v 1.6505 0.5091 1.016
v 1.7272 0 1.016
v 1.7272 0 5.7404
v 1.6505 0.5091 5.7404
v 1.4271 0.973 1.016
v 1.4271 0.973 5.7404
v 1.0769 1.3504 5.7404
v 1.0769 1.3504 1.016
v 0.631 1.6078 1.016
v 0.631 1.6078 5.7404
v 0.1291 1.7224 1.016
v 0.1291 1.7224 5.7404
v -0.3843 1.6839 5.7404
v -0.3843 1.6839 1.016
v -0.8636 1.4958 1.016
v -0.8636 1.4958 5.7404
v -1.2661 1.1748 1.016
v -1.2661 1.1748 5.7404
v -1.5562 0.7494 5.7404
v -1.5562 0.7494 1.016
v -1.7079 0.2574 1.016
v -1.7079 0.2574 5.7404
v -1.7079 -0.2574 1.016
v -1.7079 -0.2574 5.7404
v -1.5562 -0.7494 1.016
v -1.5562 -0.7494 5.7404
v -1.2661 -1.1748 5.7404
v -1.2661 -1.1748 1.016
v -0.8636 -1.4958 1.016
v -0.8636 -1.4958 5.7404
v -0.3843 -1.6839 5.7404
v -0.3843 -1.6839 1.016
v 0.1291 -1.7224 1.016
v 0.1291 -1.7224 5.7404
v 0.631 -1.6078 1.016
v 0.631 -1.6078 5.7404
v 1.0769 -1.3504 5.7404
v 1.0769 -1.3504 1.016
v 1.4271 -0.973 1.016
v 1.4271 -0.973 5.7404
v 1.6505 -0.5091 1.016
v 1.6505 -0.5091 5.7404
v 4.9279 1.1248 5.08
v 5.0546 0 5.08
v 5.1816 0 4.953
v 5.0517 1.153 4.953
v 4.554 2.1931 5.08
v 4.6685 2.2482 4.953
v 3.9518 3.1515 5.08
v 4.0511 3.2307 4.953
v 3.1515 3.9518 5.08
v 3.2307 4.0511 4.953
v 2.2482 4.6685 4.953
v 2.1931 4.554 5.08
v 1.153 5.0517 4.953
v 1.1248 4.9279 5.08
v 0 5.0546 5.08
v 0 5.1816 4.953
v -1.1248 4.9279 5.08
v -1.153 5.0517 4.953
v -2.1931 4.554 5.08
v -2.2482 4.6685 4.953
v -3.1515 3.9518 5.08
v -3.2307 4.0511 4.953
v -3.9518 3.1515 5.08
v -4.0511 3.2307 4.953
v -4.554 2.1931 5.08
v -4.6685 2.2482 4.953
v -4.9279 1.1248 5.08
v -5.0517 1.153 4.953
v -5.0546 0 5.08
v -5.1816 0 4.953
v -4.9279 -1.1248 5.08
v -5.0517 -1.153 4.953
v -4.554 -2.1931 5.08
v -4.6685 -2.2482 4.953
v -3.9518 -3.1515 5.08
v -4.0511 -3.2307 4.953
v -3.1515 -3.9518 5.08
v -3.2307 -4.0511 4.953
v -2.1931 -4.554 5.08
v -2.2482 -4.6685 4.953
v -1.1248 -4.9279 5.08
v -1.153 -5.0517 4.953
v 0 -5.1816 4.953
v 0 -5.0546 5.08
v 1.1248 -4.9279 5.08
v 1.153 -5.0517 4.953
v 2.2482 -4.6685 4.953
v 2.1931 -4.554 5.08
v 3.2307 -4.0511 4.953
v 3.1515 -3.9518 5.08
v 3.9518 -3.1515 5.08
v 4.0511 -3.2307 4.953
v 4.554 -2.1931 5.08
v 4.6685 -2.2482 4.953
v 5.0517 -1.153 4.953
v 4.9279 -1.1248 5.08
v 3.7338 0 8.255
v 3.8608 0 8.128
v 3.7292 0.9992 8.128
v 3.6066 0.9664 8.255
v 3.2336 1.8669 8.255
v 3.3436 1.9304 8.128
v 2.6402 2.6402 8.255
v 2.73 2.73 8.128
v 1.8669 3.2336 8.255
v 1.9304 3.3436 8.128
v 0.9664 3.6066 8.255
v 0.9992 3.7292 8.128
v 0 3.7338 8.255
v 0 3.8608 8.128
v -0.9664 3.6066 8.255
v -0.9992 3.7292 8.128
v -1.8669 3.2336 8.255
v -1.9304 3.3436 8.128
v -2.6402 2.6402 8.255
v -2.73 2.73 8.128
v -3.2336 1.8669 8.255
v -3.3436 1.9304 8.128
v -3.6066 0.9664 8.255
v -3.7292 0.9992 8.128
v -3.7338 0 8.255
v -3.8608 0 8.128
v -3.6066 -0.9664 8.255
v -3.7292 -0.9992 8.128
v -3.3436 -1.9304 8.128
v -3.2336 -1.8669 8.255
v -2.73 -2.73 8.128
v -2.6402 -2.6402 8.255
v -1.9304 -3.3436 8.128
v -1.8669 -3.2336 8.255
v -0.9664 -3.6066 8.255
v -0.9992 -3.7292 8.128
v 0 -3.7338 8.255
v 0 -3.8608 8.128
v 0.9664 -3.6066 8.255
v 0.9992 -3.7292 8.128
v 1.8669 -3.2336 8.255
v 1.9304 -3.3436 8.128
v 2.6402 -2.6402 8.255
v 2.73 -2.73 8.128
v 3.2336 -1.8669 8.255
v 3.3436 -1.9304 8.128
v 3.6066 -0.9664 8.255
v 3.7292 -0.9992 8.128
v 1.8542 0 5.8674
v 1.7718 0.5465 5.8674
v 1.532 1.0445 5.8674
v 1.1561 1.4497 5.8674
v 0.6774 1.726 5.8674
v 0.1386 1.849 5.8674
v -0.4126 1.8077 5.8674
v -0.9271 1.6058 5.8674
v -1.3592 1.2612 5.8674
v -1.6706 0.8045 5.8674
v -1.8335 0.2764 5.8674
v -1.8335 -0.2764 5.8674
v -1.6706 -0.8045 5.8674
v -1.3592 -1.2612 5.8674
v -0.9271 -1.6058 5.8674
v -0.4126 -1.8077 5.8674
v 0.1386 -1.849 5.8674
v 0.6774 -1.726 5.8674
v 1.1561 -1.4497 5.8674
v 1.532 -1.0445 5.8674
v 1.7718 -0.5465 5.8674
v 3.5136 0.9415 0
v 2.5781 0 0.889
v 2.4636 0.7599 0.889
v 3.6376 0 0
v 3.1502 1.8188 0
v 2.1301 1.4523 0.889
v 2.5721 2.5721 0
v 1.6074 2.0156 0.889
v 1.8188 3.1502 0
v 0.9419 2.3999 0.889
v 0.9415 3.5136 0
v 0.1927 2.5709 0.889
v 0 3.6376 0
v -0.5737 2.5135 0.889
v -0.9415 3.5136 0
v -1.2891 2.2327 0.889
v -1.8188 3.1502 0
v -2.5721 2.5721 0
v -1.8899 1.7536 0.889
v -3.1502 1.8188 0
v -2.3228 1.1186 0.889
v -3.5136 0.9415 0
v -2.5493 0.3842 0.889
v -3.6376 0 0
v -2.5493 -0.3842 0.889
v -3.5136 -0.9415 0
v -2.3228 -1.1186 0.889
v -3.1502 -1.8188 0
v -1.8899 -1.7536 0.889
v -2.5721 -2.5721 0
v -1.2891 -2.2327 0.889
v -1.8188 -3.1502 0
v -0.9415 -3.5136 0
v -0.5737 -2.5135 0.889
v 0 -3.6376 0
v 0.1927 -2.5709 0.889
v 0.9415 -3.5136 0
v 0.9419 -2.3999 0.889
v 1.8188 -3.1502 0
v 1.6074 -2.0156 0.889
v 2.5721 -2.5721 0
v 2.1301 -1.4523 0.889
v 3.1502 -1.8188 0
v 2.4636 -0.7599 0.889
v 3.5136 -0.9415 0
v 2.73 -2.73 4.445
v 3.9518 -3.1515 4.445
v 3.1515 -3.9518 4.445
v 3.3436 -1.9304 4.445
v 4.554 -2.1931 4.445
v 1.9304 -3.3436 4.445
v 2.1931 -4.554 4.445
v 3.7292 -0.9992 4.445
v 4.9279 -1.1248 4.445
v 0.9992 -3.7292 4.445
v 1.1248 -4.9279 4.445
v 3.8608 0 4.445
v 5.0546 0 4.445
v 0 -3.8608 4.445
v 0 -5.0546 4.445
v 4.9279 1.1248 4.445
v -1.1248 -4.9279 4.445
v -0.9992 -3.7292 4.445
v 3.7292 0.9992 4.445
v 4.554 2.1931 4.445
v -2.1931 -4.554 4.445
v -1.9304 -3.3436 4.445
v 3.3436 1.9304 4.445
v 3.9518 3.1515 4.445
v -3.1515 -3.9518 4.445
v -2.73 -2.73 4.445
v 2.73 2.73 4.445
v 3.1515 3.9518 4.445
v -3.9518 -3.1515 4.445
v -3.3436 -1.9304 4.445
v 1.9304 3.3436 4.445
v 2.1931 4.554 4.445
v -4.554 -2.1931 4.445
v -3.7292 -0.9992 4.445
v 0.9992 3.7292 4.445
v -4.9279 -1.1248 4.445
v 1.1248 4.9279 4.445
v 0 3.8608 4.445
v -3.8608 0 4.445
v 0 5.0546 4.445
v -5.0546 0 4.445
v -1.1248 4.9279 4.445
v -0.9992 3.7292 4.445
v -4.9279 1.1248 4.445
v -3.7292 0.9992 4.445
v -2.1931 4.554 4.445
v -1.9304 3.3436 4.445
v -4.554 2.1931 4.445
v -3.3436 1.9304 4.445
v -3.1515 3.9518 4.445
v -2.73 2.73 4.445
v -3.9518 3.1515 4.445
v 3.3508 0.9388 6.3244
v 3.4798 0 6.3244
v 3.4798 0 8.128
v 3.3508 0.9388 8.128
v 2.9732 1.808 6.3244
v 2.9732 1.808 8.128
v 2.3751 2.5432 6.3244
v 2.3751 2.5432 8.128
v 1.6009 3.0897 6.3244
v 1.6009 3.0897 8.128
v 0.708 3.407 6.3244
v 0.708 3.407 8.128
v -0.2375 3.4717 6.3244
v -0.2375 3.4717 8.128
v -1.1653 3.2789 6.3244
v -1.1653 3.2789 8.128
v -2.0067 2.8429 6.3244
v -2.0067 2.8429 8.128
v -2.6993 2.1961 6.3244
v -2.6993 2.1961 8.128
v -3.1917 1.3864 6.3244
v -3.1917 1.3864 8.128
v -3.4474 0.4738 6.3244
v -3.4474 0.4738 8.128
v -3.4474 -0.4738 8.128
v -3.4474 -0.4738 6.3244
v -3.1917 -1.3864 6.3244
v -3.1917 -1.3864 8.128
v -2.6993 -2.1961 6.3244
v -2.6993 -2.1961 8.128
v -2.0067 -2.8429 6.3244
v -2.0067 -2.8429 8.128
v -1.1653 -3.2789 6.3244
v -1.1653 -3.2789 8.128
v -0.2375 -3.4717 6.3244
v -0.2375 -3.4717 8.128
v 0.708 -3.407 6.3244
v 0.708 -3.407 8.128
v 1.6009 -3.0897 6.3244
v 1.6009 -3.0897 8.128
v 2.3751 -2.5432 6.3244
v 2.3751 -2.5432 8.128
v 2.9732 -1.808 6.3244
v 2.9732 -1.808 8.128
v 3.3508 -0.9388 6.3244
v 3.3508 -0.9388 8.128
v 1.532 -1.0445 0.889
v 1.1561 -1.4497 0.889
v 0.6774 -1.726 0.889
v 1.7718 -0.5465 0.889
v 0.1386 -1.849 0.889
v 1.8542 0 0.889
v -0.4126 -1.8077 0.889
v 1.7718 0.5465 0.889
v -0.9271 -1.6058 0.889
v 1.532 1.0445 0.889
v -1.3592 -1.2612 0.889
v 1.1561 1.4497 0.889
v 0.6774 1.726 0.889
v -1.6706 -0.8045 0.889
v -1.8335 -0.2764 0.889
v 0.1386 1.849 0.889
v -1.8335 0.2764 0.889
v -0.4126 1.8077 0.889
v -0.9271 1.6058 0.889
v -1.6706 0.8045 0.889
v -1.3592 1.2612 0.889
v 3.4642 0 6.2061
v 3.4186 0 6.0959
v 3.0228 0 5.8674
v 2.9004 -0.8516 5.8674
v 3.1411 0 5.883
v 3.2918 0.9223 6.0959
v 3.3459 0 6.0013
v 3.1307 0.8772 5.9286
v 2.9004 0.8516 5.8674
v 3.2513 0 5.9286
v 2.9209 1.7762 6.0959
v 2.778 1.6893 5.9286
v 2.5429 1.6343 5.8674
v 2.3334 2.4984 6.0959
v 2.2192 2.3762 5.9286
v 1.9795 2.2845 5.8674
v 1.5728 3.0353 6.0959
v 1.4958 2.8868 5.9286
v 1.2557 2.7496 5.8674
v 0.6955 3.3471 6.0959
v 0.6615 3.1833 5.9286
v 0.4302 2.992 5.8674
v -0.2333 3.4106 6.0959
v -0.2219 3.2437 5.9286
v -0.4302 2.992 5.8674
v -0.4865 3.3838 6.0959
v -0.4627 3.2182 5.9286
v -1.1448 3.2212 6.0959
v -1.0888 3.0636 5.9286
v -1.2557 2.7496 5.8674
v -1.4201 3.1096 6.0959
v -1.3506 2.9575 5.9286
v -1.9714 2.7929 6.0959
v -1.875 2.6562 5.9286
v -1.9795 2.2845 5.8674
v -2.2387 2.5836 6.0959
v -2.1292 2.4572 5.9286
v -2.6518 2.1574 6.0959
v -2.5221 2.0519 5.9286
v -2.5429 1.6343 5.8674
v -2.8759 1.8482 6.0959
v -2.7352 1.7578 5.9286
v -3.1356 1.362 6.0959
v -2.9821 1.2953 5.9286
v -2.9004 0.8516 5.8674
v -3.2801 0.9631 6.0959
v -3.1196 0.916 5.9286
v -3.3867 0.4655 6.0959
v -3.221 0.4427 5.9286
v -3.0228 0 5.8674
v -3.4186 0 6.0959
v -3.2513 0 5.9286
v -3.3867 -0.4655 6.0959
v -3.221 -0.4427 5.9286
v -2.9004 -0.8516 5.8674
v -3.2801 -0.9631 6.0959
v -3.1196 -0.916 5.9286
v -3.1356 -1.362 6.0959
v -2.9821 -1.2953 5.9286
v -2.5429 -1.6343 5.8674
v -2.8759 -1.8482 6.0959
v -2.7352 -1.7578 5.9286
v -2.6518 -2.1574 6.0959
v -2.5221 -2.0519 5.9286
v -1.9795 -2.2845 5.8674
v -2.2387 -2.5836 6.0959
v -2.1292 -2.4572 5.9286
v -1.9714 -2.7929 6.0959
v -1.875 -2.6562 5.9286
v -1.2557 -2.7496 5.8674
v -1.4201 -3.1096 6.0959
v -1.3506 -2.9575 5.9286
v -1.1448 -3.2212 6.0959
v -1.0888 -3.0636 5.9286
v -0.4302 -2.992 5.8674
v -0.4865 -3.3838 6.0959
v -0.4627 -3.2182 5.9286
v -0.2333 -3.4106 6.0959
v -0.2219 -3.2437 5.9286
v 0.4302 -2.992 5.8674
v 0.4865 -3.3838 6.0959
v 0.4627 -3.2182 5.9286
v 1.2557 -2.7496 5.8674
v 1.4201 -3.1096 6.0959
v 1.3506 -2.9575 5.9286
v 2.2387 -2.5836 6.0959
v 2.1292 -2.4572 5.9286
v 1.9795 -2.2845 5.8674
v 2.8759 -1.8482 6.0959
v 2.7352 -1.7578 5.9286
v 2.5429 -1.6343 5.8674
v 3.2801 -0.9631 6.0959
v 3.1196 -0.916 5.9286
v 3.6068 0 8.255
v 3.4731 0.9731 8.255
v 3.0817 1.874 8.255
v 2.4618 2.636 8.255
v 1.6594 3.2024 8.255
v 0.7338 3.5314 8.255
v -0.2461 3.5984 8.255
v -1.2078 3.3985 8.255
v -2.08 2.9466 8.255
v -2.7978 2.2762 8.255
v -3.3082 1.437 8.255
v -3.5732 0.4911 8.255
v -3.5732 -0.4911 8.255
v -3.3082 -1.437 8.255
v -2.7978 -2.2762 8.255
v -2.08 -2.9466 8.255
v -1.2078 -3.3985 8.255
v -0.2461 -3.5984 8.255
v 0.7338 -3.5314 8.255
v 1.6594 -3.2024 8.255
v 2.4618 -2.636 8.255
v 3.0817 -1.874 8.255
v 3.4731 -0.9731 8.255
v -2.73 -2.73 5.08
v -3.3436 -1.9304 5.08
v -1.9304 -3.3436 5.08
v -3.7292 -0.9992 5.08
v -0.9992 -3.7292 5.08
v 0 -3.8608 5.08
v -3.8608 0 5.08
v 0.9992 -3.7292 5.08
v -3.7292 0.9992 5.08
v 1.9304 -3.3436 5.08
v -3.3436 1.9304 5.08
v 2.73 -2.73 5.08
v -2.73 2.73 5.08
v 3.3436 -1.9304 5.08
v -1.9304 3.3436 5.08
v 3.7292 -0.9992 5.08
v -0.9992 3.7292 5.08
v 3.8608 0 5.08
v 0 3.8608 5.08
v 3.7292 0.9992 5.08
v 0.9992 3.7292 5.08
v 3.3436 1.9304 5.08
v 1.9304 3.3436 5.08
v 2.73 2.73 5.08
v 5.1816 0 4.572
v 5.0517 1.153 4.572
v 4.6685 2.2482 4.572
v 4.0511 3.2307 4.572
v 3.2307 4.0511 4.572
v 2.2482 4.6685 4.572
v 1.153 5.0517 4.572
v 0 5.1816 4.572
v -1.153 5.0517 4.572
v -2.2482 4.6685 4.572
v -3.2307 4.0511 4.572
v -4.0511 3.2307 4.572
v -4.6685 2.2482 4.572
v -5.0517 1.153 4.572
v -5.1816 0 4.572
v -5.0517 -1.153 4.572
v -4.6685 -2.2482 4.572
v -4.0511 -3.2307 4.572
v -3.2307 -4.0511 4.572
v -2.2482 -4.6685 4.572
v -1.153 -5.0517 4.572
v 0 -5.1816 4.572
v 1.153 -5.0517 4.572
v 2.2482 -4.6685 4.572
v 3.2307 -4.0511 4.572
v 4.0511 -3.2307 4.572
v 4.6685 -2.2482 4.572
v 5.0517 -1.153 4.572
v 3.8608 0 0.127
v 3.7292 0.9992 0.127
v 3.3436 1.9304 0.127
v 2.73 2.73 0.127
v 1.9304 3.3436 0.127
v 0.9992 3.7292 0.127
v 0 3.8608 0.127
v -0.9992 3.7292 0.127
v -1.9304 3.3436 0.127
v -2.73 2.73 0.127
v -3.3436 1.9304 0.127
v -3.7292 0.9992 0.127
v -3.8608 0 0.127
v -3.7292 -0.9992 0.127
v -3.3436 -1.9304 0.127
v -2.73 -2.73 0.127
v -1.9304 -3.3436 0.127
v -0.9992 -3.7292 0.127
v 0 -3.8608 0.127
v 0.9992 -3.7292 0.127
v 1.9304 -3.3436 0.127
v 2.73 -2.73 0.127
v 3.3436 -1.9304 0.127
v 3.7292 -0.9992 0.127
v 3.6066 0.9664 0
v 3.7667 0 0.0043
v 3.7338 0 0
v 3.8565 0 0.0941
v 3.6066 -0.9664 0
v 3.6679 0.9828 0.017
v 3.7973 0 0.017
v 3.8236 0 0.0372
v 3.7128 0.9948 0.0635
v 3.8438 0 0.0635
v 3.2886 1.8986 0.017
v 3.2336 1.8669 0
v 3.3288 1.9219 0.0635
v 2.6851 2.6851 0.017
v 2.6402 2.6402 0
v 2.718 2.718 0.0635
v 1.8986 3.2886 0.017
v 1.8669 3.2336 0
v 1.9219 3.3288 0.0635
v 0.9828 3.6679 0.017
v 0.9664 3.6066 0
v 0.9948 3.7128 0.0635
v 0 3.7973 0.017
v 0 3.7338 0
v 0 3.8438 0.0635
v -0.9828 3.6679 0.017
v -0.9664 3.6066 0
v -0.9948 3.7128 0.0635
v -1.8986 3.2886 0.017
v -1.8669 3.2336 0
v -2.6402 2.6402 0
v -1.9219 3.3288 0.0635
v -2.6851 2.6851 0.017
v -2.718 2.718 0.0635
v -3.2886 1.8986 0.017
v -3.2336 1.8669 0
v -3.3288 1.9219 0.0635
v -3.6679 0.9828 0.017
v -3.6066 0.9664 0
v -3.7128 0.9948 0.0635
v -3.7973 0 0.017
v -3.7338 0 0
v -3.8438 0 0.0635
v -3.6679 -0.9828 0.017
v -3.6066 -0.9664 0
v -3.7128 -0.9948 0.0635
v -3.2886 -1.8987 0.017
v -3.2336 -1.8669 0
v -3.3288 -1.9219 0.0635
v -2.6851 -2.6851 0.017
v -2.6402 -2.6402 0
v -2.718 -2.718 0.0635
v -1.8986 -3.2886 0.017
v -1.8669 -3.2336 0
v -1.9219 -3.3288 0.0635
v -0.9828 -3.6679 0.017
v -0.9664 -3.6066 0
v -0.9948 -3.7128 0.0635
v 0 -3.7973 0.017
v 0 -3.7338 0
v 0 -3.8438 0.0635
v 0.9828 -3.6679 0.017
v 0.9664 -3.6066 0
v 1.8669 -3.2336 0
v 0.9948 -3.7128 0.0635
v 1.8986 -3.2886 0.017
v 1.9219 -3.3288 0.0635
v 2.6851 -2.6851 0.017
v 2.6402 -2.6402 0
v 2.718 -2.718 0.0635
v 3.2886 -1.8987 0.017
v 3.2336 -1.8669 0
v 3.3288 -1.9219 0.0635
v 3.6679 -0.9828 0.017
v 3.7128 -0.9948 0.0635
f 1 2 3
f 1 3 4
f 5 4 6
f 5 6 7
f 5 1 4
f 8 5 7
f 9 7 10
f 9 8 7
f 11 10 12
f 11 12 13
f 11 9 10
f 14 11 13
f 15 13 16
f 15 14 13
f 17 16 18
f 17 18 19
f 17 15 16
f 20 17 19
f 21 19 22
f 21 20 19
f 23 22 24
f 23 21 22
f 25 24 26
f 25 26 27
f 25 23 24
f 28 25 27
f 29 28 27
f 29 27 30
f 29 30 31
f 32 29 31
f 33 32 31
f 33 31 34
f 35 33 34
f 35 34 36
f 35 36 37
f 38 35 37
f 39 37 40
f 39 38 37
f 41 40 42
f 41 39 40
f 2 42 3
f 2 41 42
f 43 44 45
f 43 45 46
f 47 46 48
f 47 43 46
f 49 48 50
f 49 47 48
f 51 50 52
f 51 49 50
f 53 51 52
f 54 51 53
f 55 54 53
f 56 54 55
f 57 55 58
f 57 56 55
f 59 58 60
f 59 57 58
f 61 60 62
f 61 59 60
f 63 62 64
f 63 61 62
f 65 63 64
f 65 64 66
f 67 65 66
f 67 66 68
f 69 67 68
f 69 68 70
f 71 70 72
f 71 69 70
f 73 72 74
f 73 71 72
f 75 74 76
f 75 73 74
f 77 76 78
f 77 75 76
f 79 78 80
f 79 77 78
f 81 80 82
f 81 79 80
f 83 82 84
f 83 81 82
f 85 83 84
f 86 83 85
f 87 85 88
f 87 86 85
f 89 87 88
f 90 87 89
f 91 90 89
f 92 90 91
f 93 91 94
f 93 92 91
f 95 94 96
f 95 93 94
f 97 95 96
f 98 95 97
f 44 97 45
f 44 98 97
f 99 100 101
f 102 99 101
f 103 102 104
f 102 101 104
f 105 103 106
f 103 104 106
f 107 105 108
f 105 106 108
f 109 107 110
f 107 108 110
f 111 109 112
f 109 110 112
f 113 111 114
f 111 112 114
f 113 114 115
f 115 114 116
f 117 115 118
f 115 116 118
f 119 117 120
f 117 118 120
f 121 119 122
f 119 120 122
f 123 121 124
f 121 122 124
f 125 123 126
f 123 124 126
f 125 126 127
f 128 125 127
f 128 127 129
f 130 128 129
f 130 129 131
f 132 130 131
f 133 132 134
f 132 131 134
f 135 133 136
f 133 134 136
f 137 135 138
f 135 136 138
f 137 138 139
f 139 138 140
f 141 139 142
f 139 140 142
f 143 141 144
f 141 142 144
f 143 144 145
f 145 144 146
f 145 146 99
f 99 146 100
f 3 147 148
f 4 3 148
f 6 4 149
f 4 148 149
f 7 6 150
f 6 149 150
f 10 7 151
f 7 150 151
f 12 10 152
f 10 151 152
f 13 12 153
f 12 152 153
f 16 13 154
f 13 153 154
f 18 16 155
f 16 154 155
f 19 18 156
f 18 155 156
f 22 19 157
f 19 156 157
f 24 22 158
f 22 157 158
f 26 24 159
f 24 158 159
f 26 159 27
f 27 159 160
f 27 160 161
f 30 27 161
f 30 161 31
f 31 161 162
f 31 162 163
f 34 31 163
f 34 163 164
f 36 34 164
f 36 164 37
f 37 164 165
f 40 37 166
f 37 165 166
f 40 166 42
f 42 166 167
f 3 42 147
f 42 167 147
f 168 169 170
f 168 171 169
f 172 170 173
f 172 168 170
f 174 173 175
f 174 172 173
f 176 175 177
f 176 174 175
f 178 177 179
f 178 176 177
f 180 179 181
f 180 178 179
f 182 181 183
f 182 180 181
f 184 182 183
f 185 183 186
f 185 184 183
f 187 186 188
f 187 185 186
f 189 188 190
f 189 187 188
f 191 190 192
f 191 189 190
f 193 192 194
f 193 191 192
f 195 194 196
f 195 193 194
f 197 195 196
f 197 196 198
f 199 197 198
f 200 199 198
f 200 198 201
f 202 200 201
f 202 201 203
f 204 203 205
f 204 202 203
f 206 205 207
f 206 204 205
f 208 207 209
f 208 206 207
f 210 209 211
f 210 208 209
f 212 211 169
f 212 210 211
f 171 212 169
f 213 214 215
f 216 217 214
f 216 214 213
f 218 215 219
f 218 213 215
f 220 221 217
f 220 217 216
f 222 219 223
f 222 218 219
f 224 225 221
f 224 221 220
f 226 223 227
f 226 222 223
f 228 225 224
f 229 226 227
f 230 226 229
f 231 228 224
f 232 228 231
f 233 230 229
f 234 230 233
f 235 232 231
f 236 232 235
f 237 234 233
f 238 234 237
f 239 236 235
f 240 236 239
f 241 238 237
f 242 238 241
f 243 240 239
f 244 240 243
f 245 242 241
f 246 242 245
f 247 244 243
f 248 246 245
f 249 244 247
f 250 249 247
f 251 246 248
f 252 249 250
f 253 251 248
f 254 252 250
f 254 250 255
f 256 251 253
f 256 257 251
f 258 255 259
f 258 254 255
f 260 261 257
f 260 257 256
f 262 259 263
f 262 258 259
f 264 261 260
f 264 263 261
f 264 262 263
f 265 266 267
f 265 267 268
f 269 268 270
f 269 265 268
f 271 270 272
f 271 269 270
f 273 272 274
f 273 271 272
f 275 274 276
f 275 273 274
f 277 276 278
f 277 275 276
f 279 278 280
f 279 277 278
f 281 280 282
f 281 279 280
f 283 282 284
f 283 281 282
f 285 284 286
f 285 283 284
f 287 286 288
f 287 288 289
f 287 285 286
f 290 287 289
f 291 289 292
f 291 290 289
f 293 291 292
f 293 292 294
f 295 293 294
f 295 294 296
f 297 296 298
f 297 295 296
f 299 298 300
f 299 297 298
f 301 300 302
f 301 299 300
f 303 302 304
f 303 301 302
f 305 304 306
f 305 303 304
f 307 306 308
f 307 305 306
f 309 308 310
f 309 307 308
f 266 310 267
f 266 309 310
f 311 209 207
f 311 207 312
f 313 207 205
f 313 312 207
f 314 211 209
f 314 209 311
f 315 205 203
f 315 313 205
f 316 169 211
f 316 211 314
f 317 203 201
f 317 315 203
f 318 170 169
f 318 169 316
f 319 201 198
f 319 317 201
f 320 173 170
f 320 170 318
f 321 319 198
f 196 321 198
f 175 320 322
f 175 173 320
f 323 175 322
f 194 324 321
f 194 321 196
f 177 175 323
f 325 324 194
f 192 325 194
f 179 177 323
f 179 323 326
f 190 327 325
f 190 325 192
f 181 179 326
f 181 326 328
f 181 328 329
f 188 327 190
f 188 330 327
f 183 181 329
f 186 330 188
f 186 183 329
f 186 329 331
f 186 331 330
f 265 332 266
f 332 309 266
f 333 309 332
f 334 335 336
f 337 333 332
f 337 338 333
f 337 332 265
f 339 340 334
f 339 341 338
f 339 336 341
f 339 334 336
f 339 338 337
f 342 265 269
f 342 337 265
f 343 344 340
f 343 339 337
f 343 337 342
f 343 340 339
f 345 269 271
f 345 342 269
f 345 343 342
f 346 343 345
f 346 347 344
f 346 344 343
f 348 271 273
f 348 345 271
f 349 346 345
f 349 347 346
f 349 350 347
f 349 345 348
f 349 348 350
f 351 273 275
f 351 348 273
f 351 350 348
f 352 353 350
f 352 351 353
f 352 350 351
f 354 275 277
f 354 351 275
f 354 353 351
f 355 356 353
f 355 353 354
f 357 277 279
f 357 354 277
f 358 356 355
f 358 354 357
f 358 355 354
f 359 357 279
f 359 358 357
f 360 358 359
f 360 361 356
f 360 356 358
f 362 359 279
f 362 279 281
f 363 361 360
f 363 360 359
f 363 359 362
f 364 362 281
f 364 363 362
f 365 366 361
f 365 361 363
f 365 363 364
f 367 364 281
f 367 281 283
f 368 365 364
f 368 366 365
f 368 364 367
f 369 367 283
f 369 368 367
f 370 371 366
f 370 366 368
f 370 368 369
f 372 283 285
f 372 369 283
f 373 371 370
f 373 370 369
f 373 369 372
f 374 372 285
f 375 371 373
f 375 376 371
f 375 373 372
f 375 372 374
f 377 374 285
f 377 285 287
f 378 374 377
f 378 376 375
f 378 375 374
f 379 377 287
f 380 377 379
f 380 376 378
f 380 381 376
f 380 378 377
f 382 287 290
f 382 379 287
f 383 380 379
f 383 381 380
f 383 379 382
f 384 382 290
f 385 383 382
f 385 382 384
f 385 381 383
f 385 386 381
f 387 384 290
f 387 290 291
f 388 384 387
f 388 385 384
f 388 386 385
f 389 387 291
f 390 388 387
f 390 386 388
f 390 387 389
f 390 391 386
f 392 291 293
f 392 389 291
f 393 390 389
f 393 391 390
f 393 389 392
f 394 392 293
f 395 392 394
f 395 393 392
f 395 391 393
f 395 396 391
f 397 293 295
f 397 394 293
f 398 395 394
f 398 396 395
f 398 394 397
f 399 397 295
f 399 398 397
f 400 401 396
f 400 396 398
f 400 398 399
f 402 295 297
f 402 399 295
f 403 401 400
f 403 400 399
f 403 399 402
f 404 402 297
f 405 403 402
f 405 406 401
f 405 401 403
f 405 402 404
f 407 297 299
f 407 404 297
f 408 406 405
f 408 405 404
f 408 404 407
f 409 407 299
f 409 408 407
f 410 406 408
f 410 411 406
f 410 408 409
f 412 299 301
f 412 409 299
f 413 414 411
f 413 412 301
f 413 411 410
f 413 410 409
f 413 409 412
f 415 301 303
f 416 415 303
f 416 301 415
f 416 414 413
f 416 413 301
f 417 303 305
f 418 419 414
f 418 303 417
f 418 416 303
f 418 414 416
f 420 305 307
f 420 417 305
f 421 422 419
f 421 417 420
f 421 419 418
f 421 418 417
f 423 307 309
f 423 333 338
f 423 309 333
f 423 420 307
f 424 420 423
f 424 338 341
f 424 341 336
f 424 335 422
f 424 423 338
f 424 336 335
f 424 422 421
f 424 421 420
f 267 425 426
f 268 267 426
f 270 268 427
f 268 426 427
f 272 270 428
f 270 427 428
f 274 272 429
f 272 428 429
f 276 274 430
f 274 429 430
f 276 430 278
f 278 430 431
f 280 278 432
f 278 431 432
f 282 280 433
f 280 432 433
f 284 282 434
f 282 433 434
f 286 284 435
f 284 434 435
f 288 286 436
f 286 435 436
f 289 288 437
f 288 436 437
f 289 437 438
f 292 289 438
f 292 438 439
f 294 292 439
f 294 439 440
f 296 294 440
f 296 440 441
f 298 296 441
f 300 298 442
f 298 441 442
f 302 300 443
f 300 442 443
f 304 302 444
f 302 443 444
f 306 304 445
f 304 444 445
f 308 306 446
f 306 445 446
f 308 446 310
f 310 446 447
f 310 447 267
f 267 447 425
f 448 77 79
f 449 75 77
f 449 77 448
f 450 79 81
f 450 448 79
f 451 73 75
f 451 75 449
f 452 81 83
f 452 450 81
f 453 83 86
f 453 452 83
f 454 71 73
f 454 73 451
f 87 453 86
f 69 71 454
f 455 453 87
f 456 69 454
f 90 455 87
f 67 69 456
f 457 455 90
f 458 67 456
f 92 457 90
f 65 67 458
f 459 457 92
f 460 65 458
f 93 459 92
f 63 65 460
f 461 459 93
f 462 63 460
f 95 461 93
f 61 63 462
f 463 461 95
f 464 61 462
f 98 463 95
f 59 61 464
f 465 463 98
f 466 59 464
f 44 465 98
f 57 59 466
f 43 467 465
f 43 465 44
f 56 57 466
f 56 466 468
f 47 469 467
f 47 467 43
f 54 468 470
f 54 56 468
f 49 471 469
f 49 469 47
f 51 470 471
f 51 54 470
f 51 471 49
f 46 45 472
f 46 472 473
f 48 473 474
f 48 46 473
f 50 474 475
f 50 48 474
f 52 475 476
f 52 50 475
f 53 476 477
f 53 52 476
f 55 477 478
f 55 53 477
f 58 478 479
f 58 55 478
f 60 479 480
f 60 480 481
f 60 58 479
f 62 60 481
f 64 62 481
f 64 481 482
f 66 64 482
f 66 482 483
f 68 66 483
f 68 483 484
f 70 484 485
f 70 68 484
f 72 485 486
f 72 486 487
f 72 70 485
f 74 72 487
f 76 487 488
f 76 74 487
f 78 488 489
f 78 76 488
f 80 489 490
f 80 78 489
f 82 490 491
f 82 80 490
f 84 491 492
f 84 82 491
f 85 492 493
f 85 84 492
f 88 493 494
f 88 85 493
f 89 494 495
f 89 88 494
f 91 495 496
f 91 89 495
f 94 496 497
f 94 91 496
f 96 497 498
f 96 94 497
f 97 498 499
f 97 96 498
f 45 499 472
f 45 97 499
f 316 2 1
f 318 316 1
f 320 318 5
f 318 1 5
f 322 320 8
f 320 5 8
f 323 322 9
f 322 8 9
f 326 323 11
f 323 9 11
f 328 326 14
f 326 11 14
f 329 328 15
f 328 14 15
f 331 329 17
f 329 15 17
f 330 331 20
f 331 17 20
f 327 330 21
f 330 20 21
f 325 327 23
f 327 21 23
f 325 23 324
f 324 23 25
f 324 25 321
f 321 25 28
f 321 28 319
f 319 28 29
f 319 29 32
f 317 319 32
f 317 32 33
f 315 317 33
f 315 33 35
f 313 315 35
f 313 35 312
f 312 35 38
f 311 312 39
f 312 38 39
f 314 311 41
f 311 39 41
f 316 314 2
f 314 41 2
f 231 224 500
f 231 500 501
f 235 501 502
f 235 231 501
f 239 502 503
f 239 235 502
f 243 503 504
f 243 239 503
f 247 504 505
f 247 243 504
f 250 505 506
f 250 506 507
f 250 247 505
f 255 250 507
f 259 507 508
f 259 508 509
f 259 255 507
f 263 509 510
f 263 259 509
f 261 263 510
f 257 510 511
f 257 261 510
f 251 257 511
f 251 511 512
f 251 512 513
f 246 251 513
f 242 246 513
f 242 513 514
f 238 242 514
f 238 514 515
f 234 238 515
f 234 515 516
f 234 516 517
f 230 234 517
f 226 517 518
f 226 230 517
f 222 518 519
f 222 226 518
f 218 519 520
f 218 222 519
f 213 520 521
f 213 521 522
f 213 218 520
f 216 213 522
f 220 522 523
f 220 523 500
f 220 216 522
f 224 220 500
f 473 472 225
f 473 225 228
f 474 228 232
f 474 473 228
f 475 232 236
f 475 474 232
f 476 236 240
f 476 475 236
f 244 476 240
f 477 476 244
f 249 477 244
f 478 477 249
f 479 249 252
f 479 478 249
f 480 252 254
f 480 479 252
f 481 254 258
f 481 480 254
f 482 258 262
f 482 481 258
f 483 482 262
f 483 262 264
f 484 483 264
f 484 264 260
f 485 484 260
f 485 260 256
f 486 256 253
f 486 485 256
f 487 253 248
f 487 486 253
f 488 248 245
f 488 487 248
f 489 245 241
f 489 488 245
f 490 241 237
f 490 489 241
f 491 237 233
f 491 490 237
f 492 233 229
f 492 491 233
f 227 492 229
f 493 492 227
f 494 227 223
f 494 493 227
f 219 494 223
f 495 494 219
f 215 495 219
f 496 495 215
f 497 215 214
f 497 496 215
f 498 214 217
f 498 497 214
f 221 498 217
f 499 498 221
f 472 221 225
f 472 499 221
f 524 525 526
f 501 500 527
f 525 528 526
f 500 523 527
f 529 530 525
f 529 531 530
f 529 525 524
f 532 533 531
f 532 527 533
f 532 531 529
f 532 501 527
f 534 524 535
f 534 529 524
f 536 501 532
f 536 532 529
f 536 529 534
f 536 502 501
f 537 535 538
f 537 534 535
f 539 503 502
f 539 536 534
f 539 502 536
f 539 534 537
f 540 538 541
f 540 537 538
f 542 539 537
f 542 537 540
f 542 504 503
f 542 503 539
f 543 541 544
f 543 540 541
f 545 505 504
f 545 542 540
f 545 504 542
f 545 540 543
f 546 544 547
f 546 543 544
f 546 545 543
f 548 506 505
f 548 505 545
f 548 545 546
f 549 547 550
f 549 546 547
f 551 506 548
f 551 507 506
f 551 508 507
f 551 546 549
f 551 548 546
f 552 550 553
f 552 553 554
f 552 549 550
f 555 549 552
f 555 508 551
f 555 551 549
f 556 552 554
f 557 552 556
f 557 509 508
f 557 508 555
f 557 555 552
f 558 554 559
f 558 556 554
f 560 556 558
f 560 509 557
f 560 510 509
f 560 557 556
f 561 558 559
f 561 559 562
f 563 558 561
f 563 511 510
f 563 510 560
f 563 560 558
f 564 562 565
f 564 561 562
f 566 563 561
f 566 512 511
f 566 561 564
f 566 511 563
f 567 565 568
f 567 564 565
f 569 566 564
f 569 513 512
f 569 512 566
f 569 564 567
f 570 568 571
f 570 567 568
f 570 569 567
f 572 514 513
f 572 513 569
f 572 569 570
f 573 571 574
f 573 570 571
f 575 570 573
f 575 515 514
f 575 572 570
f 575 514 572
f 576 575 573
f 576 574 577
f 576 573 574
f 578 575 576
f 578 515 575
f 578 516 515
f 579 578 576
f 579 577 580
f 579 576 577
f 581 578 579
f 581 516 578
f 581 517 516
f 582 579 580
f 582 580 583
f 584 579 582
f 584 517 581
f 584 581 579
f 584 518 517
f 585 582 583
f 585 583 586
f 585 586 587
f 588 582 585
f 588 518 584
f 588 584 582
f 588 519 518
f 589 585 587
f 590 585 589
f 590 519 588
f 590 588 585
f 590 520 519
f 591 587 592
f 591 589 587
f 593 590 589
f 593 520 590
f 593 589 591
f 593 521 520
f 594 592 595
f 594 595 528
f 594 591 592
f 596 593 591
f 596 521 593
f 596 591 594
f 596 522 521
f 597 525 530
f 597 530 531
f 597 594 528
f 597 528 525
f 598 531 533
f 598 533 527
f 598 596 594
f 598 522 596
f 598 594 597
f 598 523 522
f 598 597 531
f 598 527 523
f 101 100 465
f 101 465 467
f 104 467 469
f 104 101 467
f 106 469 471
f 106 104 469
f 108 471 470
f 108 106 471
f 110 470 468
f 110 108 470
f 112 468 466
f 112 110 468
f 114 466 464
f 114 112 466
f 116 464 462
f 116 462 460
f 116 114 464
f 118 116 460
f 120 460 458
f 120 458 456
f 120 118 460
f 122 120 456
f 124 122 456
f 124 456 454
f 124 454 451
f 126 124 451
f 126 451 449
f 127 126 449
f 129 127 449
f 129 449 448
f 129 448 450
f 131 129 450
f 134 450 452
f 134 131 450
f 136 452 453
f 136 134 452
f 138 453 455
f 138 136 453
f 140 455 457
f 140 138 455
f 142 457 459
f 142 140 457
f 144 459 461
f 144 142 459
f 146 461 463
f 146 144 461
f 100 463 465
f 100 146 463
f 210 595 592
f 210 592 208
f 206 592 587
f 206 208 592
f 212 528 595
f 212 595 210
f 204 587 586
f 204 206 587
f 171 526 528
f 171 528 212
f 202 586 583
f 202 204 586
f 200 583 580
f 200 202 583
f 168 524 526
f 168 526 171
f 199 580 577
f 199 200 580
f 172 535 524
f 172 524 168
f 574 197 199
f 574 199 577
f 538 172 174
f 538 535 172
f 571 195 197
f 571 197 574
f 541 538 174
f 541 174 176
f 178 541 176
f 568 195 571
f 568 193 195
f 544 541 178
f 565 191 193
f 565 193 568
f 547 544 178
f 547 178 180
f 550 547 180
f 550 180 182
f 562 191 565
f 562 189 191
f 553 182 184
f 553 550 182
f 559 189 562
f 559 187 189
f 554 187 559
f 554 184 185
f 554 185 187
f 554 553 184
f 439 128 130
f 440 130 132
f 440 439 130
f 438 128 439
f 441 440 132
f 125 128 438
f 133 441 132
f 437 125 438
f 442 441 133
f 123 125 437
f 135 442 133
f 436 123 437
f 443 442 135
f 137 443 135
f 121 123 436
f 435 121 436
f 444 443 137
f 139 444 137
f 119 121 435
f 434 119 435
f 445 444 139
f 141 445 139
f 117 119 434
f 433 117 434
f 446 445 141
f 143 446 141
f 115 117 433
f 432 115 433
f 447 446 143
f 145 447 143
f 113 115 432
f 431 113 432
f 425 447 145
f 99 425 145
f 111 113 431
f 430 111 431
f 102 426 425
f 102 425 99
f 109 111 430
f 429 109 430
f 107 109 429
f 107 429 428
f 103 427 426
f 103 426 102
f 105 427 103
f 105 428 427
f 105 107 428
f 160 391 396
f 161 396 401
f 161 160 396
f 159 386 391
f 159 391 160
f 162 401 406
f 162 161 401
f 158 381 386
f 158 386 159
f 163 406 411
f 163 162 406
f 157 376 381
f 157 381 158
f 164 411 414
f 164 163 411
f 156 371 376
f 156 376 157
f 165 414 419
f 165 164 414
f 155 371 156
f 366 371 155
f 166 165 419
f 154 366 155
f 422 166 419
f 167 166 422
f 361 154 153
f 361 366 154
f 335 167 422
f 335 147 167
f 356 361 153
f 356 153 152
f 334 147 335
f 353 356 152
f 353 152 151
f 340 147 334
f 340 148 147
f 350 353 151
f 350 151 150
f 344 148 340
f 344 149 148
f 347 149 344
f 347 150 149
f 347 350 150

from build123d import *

# Parameters (mm, degrees)
F2_R    = 0.127
F3_SIZE = 0.127
F4_SIZE = 0.127


with BuildPart() as f1:
    # F0 (on Front) → F1 (revolve)
    with BuildSketch(Plane.XZ):
        with BuildLine():
            Line((3.8608, 8.255), (3.4798, 8.255))
            Line((3.4798, 8.255), (3.4798, 6.324395))
            ThreePointArc((3.4798, 6.324395), (3.345949, 6.001251), (3.022805, 5.8674))
            Line((3.022805, 5.8674), (1.7272, 5.8674))
            Line((1.7272, 5.8674), (1.7272, 0.889))
            Line((1.7272, 0.889), (2.5781, 0.889))
            Line((2.5781, 0.889), (3.637569, 0))
            Line((3.637569, 0), (3.8608, 0))
            Line((3.8608, 0), (3.8608, 4.445))
            Line((3.8608, 4.445), (5.1816, 4.445))
            Line((5.1816, 4.445), (5.1816, 5.08))
            Line((5.1816, 5.08), (3.8608, 5.08))
            Line((3.8608, 5.08), (3.8608, 8.255))
        make_face()
    revolve(axis=Axis((0, 0, 7.74301), (0, 0, 1)))

    # F2
    f2_edges = [f1.edges().sort_by_distance(p)[0] for p in [
        (-3.8608, 0, 0),
    ]]
    fillet(f2_edges, radius=F2_R)

    # F3
    f3_edges = [f1.edges().sort_by_distance(p)[0] for p in [
        (-1.7272, 0, 0.889),
    ]]
    chamfer(f3_edges, length=F3_SIZE)

    # F4
    f4_edges = [f1.edges().sort_by_distance(p)[0] for p in [
        (-1.7272, 0, 5.8674),
        (-3.4798, 0, 8.255),
        (-3.8608, 0, 8.255),
        (-5.1816, 0, 5.08),
        (-5.1816, 0, 4.445),
    ]]
    chamfer(f4_edges, length=F4_SIZE)


solid = f1.part
